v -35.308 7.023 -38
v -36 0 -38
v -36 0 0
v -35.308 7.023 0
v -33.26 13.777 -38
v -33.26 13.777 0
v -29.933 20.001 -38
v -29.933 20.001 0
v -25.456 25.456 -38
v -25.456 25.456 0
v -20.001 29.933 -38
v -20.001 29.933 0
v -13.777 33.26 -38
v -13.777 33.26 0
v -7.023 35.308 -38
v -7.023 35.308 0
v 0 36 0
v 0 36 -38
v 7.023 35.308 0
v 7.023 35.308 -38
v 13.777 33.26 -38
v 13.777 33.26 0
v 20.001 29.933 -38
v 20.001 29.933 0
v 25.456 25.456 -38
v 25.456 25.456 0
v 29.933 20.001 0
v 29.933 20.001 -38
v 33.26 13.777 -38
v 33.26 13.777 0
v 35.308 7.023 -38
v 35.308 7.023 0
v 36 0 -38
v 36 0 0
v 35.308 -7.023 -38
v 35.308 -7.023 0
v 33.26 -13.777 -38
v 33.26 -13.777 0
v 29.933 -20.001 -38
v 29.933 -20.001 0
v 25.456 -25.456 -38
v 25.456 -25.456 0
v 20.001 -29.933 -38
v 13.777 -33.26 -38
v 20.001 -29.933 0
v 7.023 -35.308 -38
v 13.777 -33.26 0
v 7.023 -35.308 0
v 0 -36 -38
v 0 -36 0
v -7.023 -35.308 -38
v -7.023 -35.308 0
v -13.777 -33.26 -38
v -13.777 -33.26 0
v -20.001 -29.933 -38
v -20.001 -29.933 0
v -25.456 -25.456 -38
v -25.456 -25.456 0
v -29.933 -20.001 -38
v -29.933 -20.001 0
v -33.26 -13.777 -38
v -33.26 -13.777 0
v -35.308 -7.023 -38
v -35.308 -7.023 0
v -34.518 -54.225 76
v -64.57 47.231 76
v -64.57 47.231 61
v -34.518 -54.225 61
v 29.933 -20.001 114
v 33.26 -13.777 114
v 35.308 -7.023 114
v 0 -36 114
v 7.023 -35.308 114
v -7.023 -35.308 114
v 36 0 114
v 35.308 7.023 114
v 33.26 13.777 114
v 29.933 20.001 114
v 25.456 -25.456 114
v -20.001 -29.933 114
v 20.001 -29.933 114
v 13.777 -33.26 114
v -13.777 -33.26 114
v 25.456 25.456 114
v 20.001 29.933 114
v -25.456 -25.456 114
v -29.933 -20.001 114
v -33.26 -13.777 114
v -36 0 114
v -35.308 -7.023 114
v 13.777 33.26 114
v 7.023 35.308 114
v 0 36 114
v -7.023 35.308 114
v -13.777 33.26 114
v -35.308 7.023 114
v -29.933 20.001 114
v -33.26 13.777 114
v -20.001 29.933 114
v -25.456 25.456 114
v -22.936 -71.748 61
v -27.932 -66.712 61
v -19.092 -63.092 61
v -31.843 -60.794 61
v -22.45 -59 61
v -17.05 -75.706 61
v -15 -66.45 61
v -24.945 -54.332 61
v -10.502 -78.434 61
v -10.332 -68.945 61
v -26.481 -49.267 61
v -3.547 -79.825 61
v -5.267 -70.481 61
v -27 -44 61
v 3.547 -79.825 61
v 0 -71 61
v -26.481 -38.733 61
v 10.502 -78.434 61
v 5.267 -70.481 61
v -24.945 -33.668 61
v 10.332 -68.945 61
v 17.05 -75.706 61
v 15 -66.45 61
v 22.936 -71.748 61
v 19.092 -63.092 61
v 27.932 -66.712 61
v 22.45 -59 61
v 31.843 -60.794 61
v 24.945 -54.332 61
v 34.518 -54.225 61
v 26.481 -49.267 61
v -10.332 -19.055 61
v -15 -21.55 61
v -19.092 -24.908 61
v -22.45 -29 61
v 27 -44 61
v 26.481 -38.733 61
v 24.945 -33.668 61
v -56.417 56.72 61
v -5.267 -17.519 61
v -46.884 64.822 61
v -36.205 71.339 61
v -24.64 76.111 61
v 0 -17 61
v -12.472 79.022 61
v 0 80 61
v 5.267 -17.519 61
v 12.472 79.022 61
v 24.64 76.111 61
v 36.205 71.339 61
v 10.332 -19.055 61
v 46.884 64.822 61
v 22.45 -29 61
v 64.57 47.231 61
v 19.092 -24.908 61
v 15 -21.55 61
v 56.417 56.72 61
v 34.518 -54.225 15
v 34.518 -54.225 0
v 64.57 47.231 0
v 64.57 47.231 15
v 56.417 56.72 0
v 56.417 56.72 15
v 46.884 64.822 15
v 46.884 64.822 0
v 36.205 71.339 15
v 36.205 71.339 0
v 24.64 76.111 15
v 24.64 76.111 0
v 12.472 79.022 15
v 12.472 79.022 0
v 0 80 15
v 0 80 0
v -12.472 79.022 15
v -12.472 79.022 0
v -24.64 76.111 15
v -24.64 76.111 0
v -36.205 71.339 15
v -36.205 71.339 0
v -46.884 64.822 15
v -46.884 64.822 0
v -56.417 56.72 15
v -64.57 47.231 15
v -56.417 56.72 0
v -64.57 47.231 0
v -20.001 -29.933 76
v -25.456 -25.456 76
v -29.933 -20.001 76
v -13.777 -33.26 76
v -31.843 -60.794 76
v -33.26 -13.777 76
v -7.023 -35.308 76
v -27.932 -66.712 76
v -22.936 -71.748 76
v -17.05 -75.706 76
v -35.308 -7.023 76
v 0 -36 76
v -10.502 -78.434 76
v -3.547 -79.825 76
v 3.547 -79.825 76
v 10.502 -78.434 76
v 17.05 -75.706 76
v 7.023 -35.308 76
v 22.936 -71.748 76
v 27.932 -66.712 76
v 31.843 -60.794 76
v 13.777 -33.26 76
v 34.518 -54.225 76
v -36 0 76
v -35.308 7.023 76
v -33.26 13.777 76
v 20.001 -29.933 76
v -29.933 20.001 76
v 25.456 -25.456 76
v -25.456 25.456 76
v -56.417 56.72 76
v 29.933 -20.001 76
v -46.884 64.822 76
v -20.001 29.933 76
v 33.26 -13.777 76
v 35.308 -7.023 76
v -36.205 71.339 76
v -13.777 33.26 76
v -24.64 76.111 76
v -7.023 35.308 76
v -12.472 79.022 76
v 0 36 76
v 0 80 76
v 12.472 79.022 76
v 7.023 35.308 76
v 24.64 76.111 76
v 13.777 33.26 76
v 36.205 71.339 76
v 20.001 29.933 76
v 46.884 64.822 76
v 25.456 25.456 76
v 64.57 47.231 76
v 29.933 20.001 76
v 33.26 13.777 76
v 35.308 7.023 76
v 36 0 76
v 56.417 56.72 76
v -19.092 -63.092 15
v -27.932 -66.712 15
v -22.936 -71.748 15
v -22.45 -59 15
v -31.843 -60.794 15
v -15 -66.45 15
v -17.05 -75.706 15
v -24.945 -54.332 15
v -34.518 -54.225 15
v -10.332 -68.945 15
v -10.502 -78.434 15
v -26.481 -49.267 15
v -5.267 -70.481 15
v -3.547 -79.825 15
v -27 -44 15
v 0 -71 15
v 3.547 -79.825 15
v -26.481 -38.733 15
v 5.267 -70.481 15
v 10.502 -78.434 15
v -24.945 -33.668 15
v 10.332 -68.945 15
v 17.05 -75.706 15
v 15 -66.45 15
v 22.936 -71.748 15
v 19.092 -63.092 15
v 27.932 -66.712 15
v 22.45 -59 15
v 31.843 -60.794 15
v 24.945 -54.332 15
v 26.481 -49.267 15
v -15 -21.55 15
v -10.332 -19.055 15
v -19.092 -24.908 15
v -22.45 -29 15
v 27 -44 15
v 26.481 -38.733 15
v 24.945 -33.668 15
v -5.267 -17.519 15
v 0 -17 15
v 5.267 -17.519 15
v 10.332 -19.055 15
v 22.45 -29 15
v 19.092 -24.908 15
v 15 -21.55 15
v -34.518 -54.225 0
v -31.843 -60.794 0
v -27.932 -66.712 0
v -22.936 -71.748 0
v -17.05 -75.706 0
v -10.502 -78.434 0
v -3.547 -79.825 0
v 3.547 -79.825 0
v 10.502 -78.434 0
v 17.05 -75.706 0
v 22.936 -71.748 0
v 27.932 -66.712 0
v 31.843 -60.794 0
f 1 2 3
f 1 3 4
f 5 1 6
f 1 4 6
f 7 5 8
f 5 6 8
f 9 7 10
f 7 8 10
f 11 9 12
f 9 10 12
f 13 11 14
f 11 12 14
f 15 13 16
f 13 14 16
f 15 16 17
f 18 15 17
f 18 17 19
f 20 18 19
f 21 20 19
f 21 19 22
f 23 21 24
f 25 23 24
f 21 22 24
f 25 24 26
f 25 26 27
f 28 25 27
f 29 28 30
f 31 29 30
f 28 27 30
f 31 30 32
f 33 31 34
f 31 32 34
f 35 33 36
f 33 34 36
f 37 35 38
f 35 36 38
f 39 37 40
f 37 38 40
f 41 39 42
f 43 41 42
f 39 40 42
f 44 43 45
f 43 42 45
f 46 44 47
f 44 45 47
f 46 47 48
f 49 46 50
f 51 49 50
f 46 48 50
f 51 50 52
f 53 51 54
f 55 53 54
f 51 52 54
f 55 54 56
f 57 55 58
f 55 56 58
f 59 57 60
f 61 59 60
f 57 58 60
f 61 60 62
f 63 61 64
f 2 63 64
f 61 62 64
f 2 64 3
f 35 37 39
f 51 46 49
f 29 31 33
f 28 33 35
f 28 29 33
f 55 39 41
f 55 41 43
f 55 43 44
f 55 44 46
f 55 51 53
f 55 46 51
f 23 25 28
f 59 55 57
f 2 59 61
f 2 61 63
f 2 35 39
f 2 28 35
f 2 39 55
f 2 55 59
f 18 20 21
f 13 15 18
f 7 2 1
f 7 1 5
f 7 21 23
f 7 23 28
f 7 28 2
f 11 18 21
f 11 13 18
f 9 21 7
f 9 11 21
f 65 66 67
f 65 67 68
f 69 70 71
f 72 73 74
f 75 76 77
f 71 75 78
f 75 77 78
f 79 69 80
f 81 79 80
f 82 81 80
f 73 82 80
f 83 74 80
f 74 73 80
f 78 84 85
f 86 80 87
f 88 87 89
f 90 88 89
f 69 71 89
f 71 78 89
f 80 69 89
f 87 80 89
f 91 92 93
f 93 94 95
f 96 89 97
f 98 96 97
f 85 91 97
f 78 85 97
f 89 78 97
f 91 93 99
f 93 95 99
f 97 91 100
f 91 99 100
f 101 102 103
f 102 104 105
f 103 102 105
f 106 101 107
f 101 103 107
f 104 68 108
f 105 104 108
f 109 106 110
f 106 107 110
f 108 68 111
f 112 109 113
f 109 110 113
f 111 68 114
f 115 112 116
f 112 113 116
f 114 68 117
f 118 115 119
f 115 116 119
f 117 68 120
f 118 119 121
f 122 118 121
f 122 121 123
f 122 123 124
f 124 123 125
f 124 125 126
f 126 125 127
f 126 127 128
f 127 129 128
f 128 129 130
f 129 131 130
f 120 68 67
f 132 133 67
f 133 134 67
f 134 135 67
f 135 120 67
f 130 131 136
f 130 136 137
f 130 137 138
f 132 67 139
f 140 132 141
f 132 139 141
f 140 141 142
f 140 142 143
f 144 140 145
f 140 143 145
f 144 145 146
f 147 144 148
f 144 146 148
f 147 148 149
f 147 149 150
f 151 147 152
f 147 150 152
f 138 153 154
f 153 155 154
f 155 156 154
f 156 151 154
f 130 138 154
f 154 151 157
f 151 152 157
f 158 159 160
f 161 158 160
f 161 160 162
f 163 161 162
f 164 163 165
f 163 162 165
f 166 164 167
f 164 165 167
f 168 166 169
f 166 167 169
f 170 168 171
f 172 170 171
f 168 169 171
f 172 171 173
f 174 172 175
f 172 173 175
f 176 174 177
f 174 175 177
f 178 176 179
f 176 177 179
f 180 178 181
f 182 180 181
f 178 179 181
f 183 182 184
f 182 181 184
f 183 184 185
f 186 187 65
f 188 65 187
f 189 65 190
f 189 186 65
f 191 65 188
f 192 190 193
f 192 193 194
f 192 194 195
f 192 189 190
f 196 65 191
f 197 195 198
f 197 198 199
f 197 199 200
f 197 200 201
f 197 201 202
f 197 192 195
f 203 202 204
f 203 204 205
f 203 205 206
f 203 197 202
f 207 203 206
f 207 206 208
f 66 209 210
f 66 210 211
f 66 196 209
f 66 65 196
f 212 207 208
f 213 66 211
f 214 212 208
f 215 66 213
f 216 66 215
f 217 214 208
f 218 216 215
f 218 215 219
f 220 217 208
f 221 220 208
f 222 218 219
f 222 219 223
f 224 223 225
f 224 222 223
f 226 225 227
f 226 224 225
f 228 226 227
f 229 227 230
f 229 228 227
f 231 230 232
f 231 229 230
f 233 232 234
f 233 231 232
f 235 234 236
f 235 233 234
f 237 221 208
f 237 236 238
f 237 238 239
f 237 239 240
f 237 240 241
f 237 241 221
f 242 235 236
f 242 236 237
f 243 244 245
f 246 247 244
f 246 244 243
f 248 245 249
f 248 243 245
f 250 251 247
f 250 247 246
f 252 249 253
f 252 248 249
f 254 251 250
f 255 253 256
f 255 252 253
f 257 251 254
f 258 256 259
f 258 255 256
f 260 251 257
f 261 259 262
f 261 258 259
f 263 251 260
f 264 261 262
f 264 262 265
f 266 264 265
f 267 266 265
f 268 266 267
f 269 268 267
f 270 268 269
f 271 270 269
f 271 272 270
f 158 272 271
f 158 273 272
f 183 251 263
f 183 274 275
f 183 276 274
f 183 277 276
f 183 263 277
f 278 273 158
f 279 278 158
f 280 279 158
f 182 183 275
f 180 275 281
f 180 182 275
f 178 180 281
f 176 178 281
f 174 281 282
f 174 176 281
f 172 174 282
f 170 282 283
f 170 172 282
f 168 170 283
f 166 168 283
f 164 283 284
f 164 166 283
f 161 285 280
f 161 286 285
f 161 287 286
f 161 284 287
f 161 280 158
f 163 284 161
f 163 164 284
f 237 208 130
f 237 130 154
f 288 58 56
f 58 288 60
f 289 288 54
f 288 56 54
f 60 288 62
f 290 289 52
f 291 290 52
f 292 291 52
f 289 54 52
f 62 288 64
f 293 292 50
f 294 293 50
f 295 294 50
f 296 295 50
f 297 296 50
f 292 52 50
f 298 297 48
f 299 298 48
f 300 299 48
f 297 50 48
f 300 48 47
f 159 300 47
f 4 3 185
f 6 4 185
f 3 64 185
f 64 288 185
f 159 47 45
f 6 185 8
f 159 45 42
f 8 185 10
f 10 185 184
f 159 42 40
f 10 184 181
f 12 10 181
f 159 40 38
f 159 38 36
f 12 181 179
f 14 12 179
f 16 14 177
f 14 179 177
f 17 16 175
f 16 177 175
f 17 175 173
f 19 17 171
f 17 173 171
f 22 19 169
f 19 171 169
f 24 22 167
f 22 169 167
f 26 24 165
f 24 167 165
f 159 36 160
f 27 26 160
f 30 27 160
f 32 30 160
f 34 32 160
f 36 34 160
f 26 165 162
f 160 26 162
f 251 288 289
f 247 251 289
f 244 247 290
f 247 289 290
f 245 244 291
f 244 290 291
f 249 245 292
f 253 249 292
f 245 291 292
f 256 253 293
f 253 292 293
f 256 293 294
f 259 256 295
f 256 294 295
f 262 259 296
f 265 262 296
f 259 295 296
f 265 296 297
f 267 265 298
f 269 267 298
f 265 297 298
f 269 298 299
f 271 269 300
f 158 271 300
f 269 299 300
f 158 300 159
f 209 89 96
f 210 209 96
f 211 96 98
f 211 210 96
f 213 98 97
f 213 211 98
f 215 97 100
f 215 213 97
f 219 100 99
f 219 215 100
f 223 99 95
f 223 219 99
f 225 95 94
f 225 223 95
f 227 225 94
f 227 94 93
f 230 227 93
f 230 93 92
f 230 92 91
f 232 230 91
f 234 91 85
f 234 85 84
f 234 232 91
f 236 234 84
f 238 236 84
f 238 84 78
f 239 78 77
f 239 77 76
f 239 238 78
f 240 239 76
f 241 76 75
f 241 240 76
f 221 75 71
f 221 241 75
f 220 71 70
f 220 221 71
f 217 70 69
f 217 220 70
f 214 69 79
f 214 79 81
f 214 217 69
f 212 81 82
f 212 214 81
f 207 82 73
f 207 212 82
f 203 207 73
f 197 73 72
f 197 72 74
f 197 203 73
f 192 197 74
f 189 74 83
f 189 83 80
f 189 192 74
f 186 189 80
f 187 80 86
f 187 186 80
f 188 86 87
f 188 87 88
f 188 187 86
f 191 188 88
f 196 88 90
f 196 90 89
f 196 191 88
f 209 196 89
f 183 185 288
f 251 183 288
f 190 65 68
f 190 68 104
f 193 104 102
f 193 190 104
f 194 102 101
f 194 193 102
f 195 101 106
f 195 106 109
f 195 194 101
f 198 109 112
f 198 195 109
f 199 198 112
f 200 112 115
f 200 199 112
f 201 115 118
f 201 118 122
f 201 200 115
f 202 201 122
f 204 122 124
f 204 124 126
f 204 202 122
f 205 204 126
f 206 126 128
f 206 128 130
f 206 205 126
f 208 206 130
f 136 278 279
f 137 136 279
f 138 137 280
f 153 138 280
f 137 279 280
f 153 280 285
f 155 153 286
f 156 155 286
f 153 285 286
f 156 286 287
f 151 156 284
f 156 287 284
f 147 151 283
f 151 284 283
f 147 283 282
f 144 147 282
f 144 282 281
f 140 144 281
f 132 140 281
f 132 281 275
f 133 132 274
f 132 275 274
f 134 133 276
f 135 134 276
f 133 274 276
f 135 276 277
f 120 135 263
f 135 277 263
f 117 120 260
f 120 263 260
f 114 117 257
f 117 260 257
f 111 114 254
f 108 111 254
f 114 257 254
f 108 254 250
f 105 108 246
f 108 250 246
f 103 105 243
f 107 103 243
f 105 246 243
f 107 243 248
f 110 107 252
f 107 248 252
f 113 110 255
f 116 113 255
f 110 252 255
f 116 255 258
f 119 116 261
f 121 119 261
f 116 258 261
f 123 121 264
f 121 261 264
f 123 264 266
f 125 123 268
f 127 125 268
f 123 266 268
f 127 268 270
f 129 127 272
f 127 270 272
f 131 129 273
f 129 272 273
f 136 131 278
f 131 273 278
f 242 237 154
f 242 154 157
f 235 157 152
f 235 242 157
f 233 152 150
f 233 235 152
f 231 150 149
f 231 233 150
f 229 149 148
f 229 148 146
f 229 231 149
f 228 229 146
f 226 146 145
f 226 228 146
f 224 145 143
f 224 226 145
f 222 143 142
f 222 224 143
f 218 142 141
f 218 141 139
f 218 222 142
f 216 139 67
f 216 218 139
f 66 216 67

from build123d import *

# Parameters (mm, degrees)
SKETCH1_R           = 36
BOSS_EXTRUDE1_DEPTH = 15
SKETCH2_R           = 27
BOSS_EXTRUDE2_DEPTH = 46
SKETCH3_R           = 36
BOSS_EXTRUDE3_DEPTH = 38


with BuildPart() as part:
    # Sketch1 → Boss-Extrude1 (new body)
    with BuildSketch(Plane.XY):
        with BuildLine():
            Line((-64.569893475, 47.23059238), (-34.517510455, -54.224552409))
            ThreePointArc((-34.517510455, -54.224552409), (-5.165734392, -8.372550074), (36, -44))
            ThreePointArc((36, -44), (35.627449926, -49.165734392), (34.517510455, -54.224552409))
            Line((34.517510455, -54.224552409), (64.569893475, 47.23059238))
            ThreePointArc((64.569893475, 47.23059238), (0, 80), (-64.569893475, 47.23059238))
        make_face()
        with Locations((0, -44)):
            Circle(SKETCH1_R)
    extrude(amount=BOSS_EXTRUDE1_DEPTH)

    # Sketch2 → Boss-Extrude2 (add)
    with BuildSketch(Plane.XY.offset(15)):
        with Locations((0, -44)):
            Circle(SKETCH2_R)
    extrude(amount=BOSS_EXTRUDE2_DEPTH)

    # Sketch3 → Boss-Extrude3 (add)
    with BuildSketch(Plane(origin=(0, 0, 0), x_dir=(-1, 0, 0), z_dir=(0, 0, -1))):
        Circle(SKETCH3_R)
    extrude(amount=BOSS_EXTRUDE3_DEPTH)

    # Mirror1: part across plane


with BuildPart() as part_1:
    add(part.part)
    add(part.part.mirror(Plane.XY.offset(38)))


solid = part_1.part
